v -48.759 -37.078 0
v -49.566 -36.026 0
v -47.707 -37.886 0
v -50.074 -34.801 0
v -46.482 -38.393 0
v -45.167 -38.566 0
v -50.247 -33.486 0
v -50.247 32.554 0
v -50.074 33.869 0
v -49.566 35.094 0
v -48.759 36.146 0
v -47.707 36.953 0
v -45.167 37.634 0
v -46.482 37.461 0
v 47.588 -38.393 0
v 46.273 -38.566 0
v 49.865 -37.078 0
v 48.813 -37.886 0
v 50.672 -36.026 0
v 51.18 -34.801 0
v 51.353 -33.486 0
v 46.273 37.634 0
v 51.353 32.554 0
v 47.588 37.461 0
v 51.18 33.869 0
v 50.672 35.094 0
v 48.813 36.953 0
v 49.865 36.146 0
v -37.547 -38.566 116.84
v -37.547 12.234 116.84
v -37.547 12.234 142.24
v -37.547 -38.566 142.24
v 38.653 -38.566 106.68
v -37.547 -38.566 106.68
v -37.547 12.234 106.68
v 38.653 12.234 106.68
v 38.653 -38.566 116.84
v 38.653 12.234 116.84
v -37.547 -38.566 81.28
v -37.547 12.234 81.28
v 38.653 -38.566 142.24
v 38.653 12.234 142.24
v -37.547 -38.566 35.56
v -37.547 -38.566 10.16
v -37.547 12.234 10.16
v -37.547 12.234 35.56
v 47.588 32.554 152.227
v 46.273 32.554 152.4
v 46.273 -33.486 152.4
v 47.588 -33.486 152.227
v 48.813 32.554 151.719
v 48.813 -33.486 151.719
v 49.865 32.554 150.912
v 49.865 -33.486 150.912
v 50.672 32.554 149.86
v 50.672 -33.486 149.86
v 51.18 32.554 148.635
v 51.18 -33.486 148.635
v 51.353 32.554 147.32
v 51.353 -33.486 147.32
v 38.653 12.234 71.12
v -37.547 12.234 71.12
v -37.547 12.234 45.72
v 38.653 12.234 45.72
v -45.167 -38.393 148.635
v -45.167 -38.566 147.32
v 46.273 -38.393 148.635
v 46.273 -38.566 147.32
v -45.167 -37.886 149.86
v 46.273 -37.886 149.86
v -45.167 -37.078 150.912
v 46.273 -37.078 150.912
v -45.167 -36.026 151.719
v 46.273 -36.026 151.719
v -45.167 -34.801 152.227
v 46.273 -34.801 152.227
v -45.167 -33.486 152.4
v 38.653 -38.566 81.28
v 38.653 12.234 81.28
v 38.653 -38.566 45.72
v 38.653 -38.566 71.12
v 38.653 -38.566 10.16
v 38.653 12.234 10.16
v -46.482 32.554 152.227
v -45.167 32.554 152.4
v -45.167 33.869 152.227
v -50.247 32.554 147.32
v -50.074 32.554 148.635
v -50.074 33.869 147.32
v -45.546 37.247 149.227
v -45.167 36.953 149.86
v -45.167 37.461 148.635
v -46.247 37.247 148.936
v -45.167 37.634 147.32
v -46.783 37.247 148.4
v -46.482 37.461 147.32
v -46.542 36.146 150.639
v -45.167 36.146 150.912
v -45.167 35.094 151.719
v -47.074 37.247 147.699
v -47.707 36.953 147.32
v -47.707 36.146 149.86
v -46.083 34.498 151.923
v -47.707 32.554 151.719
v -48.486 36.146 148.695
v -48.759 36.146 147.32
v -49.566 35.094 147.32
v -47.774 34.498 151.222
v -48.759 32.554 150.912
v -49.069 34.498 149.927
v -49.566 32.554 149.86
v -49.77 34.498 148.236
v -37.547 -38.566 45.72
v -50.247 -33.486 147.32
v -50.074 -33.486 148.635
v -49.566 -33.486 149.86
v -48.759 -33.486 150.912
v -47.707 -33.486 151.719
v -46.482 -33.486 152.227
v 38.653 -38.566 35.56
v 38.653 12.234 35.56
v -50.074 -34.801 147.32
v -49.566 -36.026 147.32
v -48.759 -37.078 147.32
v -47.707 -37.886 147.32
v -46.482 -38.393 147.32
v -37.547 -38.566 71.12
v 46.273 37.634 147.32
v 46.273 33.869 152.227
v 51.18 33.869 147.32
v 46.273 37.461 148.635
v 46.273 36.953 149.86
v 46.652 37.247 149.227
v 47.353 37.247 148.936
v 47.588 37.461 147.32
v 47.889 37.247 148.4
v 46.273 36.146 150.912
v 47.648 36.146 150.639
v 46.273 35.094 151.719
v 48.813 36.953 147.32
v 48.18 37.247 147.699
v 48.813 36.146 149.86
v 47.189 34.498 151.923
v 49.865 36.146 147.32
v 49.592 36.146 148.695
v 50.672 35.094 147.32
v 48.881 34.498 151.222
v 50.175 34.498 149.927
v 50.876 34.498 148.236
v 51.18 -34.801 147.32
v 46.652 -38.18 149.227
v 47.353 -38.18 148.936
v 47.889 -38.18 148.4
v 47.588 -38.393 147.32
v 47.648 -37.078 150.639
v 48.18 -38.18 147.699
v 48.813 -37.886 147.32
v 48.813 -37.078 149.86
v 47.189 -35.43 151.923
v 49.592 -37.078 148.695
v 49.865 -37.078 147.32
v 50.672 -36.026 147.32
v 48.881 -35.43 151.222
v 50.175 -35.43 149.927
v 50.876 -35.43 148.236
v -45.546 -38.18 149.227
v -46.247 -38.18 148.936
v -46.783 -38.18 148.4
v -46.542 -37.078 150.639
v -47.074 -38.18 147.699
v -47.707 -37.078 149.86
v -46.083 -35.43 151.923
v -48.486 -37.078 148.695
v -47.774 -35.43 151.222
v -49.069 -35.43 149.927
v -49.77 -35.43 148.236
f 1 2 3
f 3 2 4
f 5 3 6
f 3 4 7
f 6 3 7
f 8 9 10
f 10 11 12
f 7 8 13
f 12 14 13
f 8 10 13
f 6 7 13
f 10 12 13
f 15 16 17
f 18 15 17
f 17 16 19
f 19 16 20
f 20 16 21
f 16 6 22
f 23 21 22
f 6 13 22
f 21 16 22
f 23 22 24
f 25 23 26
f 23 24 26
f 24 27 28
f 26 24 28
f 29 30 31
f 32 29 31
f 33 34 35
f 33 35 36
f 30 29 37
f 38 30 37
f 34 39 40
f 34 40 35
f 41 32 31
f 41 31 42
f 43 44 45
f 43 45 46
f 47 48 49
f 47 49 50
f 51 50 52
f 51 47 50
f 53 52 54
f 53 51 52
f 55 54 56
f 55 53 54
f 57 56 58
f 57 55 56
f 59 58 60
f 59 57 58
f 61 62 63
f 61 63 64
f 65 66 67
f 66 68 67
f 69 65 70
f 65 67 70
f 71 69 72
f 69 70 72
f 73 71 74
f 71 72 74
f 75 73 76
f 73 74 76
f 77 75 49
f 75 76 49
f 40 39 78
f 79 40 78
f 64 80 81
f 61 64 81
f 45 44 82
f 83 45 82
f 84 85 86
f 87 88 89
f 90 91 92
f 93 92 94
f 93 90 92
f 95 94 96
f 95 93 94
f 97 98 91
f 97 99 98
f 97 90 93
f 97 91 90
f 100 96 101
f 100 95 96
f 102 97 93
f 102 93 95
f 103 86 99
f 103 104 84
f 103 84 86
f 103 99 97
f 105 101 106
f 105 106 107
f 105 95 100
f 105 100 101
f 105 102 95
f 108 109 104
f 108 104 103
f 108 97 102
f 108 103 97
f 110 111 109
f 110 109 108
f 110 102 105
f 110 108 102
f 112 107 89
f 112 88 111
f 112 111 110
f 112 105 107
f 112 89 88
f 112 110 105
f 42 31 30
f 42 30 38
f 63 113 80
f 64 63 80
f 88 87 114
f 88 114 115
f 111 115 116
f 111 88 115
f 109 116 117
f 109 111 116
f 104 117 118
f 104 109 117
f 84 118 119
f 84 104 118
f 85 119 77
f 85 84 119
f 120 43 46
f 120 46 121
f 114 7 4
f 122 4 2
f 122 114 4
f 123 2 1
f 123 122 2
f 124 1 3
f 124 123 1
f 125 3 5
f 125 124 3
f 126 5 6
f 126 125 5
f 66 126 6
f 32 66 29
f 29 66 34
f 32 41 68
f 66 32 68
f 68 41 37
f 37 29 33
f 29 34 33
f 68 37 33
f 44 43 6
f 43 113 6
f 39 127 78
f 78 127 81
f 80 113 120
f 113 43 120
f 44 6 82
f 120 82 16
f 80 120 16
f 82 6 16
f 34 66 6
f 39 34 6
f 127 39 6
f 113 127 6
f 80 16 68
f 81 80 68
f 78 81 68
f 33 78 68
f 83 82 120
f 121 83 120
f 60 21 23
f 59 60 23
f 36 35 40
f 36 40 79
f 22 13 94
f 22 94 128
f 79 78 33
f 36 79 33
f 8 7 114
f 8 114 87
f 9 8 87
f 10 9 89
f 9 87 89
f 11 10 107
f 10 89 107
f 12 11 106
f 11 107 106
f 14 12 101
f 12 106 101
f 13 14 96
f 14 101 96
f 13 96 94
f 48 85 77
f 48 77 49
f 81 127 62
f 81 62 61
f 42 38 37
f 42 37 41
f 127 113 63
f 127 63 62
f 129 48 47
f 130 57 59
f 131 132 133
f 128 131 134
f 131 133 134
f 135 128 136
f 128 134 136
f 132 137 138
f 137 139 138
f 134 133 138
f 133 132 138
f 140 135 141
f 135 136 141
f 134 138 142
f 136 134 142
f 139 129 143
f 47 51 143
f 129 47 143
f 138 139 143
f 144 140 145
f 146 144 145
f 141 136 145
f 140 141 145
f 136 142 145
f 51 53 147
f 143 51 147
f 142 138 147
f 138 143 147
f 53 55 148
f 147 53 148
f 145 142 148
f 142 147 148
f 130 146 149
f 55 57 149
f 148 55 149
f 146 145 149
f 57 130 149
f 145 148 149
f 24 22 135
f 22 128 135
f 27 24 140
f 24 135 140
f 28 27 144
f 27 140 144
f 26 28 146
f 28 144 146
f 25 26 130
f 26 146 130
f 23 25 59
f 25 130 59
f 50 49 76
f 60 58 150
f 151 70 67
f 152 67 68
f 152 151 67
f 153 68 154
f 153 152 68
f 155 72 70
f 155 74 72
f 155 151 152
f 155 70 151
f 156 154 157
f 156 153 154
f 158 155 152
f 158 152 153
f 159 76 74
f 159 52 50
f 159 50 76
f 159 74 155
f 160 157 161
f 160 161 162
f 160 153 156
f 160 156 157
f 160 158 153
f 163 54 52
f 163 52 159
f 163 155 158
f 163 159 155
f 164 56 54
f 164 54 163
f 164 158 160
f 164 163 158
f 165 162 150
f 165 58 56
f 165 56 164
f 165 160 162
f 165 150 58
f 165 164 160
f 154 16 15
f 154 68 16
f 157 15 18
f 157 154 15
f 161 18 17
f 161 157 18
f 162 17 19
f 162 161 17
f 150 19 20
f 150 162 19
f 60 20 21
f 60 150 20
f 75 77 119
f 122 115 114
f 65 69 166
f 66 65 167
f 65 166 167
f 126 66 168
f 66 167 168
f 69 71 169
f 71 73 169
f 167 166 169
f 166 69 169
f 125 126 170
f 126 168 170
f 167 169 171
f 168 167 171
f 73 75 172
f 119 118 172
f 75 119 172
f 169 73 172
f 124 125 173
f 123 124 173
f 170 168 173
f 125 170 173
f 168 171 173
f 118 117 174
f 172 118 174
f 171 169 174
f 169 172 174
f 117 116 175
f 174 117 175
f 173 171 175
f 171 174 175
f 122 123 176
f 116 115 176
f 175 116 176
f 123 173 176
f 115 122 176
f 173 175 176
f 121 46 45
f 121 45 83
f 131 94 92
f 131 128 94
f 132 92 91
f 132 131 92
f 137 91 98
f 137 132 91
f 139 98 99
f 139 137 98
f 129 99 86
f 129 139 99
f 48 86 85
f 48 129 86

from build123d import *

# Parameters (mm, degrees)
F0_W     = 101.6
F0_H     = 76.2
F1_DEPTH = 152.4
F2_W     = 76.2
F2_H     = 25.4
F3_DEPTH = 50.8
F4_R     = 5.08


with BuildPart() as f1:
    # F0 (on Top) → F1 (new body)
    with BuildSketch(Plane.XY):
        with Locations((0.55306, -0.46621)):
            Rectangle(F0_W, F0_H)
    extrude(amount=F1_DEPTH)

    # F2 (on face) → F3 (cut)
    with BuildSketch(Plane.XZ.offset(38.56621)):
        with Locations((0.55306, 93.98)):
            Rectangle(F2_W, F2_H)
        with Locations((0.55306, 129.54)):
            Rectangle(F2_W, F2_H)
        with Locations((0.55306, 58.42)):
            Rectangle(F2_W, F2_H)
        with Locations((0.55306, 22.86)):
            Rectangle(F2_W, F2_H)
    extrude(amount=-F3_DEPTH, mode=Mode.SUBTRACT)

    # F4
    f4_edges = [f1.edges().sort_by_distance(p)[0] for p in [
        (51.35306, -0.46621, 152.4),
        (-50.24694, -0.46621, 152.4),
        (0.55306, -38.56621, 152.4),
        (0.55306, 37.63379, 152.4),
        (51.35306, -38.56621, 76.2),
        (-50.24694, -38.56621, 76.2),
        (51.35306, 37.63379, 76.2),
        (-50.24694, 37.63379, 76.2),
    ]]
    fillet(f4_edges, radius=F4_R)


solid = f1.part
